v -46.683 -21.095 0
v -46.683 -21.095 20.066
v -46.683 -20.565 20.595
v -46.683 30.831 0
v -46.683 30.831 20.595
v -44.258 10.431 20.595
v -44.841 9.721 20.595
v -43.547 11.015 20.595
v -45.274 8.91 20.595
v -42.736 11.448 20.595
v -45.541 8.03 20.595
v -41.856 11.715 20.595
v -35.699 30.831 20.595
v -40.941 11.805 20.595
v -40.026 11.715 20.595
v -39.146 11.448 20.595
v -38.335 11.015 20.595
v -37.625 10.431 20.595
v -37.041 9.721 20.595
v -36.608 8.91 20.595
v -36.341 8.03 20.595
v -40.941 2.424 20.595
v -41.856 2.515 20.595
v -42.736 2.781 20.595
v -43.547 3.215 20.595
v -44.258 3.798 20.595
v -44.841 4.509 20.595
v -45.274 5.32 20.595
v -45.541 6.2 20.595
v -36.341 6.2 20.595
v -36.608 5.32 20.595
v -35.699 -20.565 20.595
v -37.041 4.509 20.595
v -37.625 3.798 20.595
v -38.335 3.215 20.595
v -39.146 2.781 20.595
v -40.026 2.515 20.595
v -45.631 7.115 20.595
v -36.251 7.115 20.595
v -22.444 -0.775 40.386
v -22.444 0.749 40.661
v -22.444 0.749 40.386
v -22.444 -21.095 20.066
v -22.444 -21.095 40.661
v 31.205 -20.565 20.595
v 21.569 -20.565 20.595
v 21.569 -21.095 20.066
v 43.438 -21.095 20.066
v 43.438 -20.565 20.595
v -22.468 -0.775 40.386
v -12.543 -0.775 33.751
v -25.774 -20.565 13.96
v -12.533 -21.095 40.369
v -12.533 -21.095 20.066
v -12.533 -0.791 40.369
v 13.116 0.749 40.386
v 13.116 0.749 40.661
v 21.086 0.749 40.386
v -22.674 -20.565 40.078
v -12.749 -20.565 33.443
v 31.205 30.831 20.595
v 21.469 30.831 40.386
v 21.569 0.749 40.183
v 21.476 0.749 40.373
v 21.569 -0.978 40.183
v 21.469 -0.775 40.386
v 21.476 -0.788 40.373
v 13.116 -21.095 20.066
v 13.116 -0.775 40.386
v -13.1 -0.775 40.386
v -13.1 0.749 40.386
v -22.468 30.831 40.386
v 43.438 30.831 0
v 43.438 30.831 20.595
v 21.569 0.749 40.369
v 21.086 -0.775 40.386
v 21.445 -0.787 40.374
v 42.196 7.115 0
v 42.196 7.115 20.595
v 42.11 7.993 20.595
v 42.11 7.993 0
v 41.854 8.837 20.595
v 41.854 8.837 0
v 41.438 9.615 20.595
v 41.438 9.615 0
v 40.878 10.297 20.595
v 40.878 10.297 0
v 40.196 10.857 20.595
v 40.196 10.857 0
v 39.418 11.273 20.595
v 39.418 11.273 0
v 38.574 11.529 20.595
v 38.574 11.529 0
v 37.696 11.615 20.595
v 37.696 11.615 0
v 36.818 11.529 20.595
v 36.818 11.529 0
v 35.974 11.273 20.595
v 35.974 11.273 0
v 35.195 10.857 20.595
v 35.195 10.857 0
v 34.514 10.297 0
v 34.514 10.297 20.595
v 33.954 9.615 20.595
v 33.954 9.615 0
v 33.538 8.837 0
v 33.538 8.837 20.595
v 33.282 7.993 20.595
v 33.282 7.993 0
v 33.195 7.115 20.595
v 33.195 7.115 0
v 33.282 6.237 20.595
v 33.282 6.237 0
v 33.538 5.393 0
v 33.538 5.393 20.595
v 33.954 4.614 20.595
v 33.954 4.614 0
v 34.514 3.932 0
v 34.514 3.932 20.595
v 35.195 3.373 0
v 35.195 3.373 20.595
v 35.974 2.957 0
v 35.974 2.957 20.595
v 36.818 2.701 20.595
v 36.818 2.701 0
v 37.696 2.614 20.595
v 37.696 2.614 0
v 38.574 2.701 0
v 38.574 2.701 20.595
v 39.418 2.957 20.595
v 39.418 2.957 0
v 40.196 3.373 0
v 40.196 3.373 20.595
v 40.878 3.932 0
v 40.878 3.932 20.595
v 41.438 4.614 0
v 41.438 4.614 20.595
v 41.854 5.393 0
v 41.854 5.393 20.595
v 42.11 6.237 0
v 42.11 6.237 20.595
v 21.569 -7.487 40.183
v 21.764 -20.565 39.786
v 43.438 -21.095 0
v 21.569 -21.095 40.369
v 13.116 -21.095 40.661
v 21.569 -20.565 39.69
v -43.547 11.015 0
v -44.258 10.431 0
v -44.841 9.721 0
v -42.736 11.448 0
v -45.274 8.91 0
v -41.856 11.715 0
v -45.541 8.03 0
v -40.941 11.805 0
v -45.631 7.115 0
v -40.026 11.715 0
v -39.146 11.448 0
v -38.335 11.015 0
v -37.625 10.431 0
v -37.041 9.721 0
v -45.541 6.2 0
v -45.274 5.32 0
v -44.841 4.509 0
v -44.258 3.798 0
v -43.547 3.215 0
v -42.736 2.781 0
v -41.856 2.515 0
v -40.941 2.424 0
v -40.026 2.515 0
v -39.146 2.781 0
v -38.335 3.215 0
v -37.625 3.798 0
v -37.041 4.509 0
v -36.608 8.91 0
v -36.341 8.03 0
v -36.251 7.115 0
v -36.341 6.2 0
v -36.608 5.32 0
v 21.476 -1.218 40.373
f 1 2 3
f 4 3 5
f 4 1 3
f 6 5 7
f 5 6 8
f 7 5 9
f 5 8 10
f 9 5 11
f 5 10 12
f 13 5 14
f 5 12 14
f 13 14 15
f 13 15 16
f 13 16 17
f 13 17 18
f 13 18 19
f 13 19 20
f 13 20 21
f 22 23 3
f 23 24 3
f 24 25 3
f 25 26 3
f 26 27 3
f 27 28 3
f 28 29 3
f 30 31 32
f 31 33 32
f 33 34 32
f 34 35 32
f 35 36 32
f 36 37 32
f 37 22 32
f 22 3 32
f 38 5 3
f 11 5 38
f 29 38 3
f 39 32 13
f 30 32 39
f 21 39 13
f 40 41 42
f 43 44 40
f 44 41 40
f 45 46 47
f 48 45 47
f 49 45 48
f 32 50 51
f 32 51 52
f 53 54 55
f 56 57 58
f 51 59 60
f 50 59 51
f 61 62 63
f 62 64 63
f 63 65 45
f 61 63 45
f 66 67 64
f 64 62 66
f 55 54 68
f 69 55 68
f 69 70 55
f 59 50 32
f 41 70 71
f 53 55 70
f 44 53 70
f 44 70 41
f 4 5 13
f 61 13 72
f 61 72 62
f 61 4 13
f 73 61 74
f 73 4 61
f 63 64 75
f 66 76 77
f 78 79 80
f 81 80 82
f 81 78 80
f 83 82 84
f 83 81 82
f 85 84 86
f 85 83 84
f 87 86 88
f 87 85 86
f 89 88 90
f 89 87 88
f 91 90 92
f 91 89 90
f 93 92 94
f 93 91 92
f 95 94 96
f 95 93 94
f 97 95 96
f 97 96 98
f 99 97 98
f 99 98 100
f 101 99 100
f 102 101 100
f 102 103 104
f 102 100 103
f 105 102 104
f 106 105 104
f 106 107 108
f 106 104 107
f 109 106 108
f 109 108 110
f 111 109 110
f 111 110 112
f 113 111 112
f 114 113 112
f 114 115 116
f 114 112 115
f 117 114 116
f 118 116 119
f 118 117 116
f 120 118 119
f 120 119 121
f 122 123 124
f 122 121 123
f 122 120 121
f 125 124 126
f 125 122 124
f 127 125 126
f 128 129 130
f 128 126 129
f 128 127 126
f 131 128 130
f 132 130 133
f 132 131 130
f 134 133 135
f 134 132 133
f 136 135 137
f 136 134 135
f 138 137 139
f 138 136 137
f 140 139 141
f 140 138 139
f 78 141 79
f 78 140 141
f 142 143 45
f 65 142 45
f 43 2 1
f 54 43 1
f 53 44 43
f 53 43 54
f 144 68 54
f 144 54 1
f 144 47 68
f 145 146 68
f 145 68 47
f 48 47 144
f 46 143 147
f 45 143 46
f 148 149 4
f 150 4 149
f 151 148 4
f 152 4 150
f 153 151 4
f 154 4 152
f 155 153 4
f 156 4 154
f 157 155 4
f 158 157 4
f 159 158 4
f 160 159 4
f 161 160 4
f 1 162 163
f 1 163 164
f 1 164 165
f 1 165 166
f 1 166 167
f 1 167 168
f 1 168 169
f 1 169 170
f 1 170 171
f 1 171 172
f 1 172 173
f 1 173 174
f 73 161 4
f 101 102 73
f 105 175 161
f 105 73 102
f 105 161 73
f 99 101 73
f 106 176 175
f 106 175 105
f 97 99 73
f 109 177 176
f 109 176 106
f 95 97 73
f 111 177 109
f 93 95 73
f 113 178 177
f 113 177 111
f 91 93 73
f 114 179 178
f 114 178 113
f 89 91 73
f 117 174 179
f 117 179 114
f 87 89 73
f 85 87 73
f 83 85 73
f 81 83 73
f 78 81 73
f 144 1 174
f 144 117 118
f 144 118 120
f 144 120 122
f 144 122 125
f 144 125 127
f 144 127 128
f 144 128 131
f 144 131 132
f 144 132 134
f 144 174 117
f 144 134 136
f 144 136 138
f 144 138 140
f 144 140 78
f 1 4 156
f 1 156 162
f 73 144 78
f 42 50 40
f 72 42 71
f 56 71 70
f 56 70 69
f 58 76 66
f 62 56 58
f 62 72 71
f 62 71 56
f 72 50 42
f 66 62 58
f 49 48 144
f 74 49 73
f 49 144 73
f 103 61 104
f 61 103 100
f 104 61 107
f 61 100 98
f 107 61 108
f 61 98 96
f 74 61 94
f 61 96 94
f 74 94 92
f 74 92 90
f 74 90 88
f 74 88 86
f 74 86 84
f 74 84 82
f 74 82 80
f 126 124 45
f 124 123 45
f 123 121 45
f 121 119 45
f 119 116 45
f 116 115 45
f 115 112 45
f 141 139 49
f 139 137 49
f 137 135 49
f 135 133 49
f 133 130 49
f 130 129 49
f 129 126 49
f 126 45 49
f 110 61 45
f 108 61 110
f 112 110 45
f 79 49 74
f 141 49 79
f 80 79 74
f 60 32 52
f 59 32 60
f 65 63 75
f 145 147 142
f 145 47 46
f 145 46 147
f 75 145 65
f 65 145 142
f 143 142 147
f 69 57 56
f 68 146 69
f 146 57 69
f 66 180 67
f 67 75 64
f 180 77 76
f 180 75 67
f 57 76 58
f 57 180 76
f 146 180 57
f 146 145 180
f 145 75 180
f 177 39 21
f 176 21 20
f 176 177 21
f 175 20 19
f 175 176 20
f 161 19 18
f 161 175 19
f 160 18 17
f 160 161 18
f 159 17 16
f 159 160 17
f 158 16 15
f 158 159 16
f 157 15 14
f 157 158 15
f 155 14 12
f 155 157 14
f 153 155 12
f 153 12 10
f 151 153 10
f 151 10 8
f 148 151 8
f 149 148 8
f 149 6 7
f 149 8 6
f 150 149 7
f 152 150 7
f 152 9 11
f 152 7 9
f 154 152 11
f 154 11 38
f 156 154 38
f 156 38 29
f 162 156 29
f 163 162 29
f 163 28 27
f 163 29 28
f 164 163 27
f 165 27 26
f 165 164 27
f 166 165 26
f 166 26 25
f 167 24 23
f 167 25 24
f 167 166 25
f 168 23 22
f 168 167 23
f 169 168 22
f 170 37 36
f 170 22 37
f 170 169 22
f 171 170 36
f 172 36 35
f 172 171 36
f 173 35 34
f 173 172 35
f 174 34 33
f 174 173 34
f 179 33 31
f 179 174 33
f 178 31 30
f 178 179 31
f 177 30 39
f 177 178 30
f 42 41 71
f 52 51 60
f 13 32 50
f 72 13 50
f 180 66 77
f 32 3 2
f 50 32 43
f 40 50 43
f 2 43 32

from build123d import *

# Parameters (mm, degrees)
F0_W      = 90.1204682887
F0_H      = 51.9253667444
F1_DEPTH  = 40.386
F3_DEPTH  = 91.948
F4_R      = 4.5004708043
F4_R_2    = 4.690333398
F5_DEPTH  = 57.404
F6_SIZE   = 20.32
F8_DEPTH  = 21.844
F10_DEPTH = 11.938
F12_DEPTH = 8.89


with BuildPart() as f1:
    # F0 (on Top) → F1 (new body)
    with BuildSketch(Plane.XY):
        with Locations((-1.6226675361, 4.8680035397)):
            Rectangle(F0_W, F0_H)
    extrude(amount=F1_DEPTH)

    # F2 (on face) → F3 (cut)
    with BuildSketch(Plane.XZ.offset(21.0946798325)):
        Polygon((43.4375666082, 40.386), (21.4691404253, 40.386), (31.2051493675, 20.5953978002), (43.4375666082, 20.5953978002), align=None)
        Polygon((-46.6829016805, 40.386), (-46.6829016805, 20.5953978002), (-35.6986895204, 20.5953978002), (-22.4677063525, 40.386), align=None)
    extrude(amount=-F3_DEPTH, mode=Mode.SUBTRACT)

    # F4 (on Top) → F5 (cut)
    with BuildSketch(Plane.XY):
        with Locations((37.6958213747, 7.1147740819)):
            Circle(F4_R)
        with Locations((-40.9411564469, 7.1147740819)):
            Circle(F4_R_2)
    extrude(amount=F5_DEPTH, mode=Mode.SUBTRACT)

    # F6
    f6_edges = [f1.edges().sort_by_distance(p)[0] for p in [
        (-0.499283, -21.09468, 40.386),
    ]]
    chamfer(f6_edges, length=F6_SIZE)

    # F7 (on face) → F8 (join)
    with BuildSketch(Plane.XZ.offset(21.0946798325)):
        Polygon((-12.5334421173, 40.3693430126), (-22.4436074495, 40.6608209014), (-22.4436074495, 0), (-12.5334421173, 0), align=None)
        Polygon((21.5691812336, 0), (21.5691812336, 40.3693430126), (13.1163960323, 40.6608209014), (13.1163960323, 0), align=None)
    extrude(amount=-F8_DEPTH)

    # F11 (on face) → F12 (join)
    with BuildSketch(Plane(origin=(33.2822455963, 0, 16.3732380384), x_dir=(0, 1, 0), z_dir=(0.8972974245, 0, 0.4414264741))):
        Polygon((-20.5652820323, 26.0929726064), (-20.5652820323, 4.7054183447), (-0.7746798325, 26.7612068264), align=None)
    extrude(amount=-F12_DEPTH)


with BuildPart() as f10:
    # F9 (on face) → F10 (new body)
    with BuildSketch(Plane(origin=(-34.1874023997, 0, 22.8559465315), x_dir=(0, -1, 0), z_dir=(-0.8313274378, 0, 0.5557829532))):
        Polygon((0.7746798325, 21.0868217152), (20.5652820323, -2.719203804), (20.5652820323, 20.7161735743), align=None)
    extrude(amount=-F10_DEPTH)


solid = Compound([f1.part, f10.part])
